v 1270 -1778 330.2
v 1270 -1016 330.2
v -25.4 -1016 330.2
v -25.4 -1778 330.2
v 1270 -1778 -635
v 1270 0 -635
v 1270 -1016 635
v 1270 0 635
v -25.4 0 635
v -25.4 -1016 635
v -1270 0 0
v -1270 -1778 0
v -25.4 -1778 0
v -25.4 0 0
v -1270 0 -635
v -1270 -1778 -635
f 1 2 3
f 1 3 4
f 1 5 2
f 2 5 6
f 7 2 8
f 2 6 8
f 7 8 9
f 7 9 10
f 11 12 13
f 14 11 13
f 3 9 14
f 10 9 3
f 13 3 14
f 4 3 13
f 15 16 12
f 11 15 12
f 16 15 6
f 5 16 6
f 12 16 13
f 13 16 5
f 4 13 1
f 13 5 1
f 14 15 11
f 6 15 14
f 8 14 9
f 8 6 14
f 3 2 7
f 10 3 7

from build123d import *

# Parameters (mm, degrees)
F0_W      = 2540
F0_H      = 1270
F1_DEPTH  = 1778
F2_W      = 1270
F2_H      = 635
F3_DEPTH  = 1778.001
F3_FACE_W = 1778
F3_FACE_H = 635
F4_DEPTH  = 25.4
F5_W      = 762
F5_H      = 304.8
F6_DEPTH  = 1295.401


with BuildPart() as f1:
    # F0 (on Front) → F1 (new body)
    with BuildSketch(Plane.XZ):
        Rectangle(F0_W, F0_H)
    extrude(amount=F1_DEPTH)

    # F2 (on face) → F3 (cut, through all)
    with BuildSketch(Plane.XZ.offset(1778)):
        with Locations((-635, 317.5)):
            Rectangle(F2_W, F2_H)
    extrude(amount=-F3_DEPTH, mode=Mode.SUBTRACT)

    # F3_face (on face) → F4 (join)
    with BuildSketch(Plane(origin=(0, -889, 317.5), x_dir=(0, -1, 0), z_dir=(-1, 0, 0))):
        Rectangle(F3_FACE_W, F3_FACE_H)
    extrude(amount=F4_DEPTH)

    # F5 (on face) → F6 (cut, through all)
    with BuildSketch(Plane(origin=(-25.4, 0, 0), x_dir=(0, -1, 0), z_dir=(-1, 0, 0))):
        with Locations((1397, 482.6)):
            Rectangle(F5_W, F5_H)
    extrude(amount=-F6_DEPTH, mode=Mode.SUBTRACT)


solid = f1.part
